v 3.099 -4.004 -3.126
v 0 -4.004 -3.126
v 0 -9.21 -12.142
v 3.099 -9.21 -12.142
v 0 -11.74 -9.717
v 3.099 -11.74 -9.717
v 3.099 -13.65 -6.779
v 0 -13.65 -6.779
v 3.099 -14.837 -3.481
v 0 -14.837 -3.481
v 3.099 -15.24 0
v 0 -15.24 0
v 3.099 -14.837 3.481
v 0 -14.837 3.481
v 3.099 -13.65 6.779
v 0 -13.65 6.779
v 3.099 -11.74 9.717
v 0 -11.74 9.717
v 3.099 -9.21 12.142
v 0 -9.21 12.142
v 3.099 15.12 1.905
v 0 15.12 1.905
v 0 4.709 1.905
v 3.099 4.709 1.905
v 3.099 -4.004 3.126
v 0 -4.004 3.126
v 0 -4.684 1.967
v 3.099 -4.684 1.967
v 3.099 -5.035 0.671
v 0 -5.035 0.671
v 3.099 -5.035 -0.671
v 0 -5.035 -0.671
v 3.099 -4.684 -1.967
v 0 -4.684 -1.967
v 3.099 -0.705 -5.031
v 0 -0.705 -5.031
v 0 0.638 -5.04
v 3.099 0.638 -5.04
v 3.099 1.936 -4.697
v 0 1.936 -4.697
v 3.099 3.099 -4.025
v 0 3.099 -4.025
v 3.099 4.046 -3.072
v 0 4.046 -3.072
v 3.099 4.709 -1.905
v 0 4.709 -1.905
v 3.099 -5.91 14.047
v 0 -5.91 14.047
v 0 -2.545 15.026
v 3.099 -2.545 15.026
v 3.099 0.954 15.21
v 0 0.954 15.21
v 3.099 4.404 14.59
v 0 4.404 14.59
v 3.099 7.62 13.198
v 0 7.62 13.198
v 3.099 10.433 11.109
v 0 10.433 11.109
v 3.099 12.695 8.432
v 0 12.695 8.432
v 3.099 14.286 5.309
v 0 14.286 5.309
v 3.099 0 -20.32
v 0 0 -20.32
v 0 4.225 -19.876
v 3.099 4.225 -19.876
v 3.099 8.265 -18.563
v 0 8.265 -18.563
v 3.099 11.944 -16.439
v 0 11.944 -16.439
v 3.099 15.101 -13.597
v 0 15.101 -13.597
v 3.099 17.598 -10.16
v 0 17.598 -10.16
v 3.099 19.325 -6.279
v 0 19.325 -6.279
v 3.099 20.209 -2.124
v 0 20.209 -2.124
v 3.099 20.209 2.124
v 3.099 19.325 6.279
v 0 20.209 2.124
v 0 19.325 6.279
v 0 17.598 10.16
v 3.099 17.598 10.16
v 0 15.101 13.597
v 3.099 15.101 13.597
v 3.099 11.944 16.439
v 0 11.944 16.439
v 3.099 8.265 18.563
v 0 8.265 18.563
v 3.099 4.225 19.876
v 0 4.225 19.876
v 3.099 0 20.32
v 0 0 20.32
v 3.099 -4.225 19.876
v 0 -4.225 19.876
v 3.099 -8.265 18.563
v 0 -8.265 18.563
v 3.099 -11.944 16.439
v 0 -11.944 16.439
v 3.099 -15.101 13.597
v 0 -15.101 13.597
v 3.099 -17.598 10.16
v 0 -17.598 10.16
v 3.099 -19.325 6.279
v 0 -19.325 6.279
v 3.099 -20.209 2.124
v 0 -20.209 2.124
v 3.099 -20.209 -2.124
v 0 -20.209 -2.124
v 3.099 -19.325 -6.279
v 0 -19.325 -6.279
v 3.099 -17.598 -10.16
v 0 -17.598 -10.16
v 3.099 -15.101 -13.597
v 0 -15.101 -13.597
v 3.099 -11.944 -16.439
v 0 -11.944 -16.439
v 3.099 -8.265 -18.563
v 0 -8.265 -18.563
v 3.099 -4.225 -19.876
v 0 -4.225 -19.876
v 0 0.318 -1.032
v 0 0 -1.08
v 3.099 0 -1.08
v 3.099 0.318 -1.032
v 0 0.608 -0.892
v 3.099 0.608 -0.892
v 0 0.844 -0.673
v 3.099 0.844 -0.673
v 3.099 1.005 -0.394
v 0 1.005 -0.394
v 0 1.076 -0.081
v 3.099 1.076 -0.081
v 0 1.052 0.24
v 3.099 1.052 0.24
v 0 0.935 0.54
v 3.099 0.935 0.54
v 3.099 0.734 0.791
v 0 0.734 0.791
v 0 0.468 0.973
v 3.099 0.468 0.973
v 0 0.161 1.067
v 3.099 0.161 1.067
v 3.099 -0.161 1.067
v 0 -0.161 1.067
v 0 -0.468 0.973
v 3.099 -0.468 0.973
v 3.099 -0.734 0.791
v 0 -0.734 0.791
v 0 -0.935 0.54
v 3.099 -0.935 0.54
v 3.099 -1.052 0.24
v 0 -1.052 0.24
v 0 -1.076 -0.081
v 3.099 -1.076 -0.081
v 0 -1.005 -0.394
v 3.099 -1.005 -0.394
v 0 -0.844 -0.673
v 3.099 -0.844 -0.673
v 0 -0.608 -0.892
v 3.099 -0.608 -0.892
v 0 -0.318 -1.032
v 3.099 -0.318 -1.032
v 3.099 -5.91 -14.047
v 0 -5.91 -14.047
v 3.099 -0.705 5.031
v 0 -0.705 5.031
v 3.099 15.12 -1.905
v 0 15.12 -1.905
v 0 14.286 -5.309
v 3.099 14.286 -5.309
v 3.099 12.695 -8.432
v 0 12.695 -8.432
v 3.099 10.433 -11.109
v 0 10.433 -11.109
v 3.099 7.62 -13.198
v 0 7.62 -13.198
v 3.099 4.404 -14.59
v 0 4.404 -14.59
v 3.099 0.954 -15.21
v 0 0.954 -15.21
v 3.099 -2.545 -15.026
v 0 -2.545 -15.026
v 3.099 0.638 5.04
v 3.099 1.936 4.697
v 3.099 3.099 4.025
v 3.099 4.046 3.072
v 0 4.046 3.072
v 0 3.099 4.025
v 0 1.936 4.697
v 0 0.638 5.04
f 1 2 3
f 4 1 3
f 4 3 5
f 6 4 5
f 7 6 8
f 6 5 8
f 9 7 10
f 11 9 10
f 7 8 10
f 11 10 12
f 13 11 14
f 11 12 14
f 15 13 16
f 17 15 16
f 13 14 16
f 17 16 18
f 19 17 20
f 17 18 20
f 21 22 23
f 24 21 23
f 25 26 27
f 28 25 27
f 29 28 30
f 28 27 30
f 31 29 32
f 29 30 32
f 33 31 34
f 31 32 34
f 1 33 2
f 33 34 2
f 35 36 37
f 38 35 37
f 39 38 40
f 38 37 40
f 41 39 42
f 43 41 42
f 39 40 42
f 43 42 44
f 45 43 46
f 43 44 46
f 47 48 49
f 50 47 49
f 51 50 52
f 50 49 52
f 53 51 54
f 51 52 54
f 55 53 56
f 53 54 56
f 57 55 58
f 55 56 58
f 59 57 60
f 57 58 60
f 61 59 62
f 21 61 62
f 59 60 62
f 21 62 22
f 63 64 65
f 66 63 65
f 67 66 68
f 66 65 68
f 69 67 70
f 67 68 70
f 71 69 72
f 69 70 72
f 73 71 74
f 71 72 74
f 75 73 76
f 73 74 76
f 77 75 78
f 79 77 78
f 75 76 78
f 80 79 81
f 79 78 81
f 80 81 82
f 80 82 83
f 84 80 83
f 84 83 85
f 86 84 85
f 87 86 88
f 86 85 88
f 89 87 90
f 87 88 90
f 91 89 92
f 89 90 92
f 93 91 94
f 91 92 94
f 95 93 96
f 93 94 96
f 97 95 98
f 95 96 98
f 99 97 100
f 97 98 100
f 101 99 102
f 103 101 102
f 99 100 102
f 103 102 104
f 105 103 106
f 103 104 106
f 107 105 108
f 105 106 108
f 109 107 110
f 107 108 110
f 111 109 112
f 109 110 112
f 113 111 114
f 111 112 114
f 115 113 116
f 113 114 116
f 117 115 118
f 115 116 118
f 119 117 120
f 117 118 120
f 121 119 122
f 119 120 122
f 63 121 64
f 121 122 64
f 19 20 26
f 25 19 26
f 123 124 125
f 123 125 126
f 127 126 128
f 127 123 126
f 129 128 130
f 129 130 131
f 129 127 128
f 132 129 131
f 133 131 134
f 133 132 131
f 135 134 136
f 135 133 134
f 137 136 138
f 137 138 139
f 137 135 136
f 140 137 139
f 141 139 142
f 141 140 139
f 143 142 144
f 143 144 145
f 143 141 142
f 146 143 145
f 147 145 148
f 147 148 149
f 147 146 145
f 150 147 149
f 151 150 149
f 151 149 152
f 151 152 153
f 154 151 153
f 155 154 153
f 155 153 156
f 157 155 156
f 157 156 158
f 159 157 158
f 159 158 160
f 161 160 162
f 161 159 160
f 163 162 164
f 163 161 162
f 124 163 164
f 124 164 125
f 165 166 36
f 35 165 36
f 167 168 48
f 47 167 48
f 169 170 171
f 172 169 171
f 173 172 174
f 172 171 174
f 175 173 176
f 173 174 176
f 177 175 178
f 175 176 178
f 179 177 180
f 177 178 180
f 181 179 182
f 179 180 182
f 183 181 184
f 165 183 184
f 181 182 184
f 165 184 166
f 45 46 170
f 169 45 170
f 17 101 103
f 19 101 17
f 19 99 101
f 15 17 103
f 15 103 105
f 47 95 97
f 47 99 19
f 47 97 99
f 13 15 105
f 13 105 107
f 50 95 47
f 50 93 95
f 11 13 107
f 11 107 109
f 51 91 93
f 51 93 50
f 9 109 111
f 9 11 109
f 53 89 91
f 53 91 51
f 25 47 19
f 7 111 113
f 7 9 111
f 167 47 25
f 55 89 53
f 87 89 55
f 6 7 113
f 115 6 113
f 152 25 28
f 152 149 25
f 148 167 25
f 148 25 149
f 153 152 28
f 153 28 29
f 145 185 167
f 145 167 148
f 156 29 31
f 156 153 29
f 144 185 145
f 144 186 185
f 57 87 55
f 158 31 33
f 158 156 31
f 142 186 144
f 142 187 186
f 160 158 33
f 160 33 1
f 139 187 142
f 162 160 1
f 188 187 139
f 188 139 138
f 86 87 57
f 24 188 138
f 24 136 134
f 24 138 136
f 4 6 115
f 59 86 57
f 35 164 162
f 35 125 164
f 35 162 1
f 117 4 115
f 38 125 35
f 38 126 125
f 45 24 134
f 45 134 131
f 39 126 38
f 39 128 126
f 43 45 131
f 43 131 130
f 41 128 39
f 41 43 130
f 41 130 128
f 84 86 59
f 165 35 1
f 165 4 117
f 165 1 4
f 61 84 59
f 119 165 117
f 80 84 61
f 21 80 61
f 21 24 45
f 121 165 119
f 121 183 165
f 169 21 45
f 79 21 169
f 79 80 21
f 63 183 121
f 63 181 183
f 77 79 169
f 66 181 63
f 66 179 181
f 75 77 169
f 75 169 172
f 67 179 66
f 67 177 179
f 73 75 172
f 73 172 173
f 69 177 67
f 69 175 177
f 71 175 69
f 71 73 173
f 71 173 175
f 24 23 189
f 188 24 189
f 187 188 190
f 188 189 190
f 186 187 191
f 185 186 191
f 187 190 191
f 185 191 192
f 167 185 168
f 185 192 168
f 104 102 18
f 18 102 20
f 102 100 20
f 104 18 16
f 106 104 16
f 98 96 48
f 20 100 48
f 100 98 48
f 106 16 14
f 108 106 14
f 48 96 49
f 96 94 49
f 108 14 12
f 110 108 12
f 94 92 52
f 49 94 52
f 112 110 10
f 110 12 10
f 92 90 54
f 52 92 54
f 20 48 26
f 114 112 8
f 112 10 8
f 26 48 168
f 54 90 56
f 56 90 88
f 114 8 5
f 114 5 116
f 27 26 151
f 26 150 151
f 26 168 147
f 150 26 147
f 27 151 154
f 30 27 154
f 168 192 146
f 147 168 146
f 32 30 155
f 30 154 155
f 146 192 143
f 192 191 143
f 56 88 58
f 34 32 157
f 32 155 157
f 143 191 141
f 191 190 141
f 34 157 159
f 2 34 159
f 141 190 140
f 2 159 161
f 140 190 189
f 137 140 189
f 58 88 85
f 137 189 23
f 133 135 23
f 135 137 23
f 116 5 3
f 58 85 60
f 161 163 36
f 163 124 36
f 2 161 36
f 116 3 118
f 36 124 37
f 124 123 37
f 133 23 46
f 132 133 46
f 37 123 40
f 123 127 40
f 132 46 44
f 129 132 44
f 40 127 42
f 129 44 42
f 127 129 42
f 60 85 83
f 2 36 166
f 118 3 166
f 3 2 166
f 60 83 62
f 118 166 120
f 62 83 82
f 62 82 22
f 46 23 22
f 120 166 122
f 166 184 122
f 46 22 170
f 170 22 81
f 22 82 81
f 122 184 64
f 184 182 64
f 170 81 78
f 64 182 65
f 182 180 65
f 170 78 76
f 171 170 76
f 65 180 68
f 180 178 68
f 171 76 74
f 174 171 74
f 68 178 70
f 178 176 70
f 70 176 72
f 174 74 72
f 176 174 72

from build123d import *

# Parameters (mm, degrees)
SKETCH2_R           = 20.32
SKETCH2_R_2         = 1.0795
BOSS_EXTRUDE5_DEPTH = 3.0988


with BuildPart() as part:
    # Sketch2 → Boss-Extrude5 (new body)
    with BuildSketch(Plane(origin=(0, 0, 0), x_dir=(0, 0, -1), z_dir=(1, 0, 0))):
        Circle(SKETCH2_R)
        with BuildLine():
            Line((-12.142210048, -9.210012766), (-3.125861344, -4.004421414))
            ThreePointArc((-3.125861344, -4.004421414), (0, -5.08), (3.125861344, -4.004421414))
            Line((3.125861344, -4.004421414), (12.142210048, -9.210012766))
            ThreePointArc((12.142210048, -9.210012766), (0, -15.24), (-12.142210048, -9.210012766))
        make_face(mode=Mode.SUBTRACT)
        with BuildLine():
            ThreePointArc((-14.047210048, -5.910455977), (-13.198227154, 7.62), (-1.905, 15.120468743))
            Line((-1.905, 15.120468743), (-1.905, 4.709286039))
            ThreePointArc((-1.905, 4.709286039), (-4.399409051, 2.54), (-5.030861344, -0.704864625))
            Line((-5.030861344, -0.704864625), (-14.047210048, -5.910455977))
        make_face(mode=Mode.SUBTRACT)
        Circle(SKETCH2_R_2, mode=Mode.SUBTRACT)
        with BuildLine():
            Line((1.905, 4.709286039), (1.905, 15.120468743))
            ThreePointArc((1.905, 15.120468743), (13.198227154, 7.62), (14.047210048, -5.910455977))
            Line((14.047210048, -5.910455977), (5.030861344, -0.704864625))
            ThreePointArc((5.030861344, -0.704864625), (4.399409051, 2.54), (1.905, 4.709286039))
        make_face(mode=Mode.SUBTRACT)
    extrude(amount=BOSS_EXTRUDE5_DEPTH)


solid = part.part
